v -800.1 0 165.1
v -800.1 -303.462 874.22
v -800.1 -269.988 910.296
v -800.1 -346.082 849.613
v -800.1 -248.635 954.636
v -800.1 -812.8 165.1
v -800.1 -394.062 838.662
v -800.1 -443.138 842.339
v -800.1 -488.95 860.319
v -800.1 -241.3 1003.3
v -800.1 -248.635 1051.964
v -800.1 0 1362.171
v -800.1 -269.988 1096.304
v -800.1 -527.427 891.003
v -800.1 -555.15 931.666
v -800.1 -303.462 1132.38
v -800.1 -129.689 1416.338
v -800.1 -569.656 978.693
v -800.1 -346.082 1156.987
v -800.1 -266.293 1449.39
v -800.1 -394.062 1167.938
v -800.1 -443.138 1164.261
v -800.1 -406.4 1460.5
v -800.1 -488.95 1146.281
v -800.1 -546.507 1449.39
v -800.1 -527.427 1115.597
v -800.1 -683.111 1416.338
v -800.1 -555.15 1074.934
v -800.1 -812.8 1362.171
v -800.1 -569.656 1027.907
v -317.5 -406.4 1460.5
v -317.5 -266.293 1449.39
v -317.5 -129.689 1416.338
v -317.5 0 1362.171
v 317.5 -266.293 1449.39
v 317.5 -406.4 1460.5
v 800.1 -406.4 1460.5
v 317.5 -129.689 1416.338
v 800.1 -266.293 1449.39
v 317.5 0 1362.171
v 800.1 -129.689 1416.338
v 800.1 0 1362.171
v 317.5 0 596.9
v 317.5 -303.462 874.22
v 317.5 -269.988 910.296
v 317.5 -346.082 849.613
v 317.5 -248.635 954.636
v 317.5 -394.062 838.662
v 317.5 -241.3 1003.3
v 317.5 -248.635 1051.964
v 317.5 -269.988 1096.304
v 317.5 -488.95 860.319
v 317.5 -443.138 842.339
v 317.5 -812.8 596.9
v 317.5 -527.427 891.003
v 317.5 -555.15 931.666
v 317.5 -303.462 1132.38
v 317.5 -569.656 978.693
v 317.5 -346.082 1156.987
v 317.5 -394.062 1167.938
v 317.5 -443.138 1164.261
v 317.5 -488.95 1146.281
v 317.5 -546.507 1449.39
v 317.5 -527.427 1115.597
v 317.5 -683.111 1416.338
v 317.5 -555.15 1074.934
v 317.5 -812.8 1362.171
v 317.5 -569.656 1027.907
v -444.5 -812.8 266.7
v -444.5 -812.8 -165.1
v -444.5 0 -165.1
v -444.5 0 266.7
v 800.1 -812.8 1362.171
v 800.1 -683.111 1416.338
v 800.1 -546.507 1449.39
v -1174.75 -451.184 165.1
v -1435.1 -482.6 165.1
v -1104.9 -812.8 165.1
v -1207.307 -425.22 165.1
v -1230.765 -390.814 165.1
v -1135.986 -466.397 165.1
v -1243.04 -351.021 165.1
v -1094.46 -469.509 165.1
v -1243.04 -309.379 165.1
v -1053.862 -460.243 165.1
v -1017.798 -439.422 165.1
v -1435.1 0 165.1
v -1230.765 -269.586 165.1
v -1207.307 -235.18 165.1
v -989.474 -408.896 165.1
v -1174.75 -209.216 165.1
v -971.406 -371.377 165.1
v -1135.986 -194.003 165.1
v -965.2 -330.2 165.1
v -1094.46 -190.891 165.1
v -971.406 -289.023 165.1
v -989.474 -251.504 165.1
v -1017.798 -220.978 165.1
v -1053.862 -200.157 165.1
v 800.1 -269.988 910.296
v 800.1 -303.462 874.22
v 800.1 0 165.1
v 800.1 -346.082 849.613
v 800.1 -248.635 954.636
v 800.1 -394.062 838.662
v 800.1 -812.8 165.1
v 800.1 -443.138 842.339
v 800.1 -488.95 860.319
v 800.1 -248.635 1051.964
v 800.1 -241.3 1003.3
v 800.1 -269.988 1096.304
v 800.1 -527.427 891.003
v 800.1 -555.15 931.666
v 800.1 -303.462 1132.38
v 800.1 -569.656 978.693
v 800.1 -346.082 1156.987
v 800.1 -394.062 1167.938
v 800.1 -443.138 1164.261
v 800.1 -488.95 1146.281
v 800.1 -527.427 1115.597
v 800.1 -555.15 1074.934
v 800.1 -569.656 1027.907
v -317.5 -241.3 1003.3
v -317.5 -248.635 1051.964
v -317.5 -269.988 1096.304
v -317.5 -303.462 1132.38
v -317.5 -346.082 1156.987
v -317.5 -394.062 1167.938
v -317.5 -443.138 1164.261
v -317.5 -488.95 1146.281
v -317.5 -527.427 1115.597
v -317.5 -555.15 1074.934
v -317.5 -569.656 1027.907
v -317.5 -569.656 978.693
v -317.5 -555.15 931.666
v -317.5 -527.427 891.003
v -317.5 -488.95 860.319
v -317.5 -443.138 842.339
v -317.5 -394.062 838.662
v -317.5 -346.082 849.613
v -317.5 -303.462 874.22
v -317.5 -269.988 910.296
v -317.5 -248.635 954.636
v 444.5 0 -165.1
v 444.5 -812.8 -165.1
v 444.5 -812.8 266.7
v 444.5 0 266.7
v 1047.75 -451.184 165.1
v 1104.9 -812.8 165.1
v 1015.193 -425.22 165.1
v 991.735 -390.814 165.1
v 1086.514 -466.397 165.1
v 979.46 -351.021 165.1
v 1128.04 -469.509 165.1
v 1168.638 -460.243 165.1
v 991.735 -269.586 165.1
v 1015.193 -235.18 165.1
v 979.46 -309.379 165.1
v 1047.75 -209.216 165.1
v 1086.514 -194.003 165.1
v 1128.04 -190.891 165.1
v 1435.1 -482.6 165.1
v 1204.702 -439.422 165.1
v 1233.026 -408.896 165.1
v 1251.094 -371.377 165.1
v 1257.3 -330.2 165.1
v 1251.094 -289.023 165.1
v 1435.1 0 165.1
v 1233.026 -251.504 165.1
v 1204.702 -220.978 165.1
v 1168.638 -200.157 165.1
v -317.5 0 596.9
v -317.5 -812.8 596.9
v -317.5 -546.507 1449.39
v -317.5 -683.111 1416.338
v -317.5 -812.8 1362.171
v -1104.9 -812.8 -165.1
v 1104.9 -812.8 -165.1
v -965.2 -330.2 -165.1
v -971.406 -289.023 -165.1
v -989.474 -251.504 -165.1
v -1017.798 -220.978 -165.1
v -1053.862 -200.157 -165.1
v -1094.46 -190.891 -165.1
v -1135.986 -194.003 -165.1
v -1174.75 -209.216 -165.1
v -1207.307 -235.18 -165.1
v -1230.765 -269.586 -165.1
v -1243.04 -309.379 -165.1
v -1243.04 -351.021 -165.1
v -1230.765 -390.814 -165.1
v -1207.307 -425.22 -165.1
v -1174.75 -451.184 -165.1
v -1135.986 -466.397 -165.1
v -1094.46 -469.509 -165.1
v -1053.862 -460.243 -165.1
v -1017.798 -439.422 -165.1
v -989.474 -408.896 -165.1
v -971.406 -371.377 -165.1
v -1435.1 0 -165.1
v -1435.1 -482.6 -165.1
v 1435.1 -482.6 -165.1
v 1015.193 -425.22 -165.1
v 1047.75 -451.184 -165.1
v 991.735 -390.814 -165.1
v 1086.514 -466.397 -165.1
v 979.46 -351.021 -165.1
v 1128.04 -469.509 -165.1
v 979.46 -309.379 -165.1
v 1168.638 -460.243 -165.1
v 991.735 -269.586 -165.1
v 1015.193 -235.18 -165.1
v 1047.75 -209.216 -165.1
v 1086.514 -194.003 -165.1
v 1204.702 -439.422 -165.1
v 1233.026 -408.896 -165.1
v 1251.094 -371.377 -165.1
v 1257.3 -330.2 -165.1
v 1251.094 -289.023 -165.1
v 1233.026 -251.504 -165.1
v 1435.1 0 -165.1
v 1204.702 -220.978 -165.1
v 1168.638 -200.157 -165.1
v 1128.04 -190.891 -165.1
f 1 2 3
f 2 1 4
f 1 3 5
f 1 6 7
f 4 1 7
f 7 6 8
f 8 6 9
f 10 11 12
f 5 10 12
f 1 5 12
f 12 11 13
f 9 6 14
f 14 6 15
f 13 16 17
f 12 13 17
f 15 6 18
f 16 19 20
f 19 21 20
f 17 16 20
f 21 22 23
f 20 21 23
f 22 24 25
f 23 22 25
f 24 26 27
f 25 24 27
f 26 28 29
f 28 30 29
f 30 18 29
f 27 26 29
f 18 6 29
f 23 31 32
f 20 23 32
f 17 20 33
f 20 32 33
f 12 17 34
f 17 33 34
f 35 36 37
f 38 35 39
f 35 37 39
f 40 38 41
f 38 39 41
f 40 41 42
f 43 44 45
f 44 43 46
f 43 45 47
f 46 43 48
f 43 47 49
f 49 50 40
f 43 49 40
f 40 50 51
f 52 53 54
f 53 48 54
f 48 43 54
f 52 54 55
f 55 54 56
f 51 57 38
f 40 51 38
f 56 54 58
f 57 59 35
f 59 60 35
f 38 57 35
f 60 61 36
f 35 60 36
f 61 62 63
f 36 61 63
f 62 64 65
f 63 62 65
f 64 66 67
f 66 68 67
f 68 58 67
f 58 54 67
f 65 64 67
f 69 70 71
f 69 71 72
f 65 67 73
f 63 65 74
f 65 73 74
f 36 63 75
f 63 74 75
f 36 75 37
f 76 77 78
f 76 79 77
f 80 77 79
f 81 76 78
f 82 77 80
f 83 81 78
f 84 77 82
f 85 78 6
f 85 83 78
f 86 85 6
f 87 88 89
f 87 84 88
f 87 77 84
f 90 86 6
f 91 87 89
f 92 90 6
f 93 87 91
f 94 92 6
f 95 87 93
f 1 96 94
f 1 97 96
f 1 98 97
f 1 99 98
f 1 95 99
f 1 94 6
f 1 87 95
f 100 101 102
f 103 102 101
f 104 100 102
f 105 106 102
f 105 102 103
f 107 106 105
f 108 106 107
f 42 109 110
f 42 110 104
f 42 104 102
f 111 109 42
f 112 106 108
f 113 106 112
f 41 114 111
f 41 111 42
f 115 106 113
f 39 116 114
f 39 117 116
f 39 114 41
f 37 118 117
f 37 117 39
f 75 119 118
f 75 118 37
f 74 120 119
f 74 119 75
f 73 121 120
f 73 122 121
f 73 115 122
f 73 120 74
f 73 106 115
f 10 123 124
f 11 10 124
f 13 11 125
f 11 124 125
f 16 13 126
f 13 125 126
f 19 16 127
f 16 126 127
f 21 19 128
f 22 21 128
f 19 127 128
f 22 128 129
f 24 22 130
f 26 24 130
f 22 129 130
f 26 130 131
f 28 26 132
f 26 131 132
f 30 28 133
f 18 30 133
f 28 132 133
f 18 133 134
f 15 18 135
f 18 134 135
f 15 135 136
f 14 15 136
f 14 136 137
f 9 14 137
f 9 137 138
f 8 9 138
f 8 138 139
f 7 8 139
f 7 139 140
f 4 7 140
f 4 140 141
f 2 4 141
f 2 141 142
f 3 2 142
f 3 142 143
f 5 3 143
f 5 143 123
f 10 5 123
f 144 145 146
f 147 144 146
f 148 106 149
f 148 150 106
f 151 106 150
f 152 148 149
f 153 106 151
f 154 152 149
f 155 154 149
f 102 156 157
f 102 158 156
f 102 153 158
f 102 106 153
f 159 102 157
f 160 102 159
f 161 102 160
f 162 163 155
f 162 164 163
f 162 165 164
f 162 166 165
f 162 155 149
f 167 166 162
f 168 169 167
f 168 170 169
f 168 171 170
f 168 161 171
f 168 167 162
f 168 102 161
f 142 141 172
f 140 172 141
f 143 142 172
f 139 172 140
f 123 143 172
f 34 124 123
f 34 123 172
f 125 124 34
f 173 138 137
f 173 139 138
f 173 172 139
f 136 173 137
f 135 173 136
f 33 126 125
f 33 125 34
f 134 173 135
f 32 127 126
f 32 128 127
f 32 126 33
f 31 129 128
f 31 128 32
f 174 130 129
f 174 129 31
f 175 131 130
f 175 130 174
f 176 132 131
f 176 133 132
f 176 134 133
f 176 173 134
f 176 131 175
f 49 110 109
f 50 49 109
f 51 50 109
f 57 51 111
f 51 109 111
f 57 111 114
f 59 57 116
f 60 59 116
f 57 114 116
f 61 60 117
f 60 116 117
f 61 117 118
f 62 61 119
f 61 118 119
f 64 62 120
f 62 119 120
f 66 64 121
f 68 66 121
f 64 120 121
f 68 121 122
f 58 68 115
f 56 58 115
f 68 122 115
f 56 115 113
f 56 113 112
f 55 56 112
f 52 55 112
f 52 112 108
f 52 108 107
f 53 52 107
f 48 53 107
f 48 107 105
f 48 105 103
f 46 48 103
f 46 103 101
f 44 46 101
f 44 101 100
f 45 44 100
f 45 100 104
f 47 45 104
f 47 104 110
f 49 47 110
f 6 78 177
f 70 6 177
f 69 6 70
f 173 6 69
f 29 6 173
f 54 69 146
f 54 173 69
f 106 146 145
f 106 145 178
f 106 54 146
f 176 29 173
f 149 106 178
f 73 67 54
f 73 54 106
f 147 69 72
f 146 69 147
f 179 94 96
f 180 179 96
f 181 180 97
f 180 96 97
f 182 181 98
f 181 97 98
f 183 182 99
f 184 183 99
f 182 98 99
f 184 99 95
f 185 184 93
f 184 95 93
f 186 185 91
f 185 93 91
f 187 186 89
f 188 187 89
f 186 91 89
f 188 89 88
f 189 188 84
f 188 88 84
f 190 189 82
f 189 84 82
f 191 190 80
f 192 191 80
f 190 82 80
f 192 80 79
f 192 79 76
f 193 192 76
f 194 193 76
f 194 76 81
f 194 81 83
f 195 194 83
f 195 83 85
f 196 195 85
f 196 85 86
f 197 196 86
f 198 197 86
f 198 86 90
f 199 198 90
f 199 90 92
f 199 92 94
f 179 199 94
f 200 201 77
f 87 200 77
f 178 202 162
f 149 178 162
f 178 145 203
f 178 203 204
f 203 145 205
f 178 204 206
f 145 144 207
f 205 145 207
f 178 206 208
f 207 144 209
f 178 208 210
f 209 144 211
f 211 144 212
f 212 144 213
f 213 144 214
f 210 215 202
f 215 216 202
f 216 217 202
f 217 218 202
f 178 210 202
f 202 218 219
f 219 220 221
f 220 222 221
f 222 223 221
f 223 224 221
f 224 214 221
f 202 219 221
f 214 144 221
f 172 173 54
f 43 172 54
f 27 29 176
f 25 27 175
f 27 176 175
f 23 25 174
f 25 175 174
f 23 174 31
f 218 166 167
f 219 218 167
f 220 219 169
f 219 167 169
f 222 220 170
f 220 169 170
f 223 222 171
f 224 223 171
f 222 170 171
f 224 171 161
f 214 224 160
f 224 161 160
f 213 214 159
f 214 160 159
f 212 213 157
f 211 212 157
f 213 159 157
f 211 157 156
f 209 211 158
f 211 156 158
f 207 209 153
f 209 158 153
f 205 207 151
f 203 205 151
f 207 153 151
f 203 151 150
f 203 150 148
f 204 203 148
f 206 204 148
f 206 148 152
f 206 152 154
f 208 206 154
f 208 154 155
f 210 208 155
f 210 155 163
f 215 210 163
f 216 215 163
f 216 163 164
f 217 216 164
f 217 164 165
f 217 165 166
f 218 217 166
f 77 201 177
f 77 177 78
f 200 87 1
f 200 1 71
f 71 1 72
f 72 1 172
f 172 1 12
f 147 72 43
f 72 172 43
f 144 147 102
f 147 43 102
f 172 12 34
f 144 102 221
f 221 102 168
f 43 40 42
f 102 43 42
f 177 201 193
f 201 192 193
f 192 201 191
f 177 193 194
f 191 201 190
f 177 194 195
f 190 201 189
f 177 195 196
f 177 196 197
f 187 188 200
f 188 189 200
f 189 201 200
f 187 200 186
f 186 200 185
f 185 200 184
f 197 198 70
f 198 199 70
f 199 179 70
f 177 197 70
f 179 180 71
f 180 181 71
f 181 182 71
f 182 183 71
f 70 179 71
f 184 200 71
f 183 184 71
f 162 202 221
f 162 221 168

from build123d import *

# Parameters (mm, degrees)
F0_W       = 2870.2
F0_H       = 330.2
F1_DEPTH   = 25.4
F2_DEPTH   = 812.8
F3_W       = 482.6
F3_H       = 1295.4
F4_DEPTH   = 812.8
F5_W       = 635
F5_H       = 431.8
F6_DEPTH   = 812.8
F7_W       = 889
F7_H       = 431.8
F8_DEPTH   = 812.801
F9_R       = 139.7
F10_DEPTH  = 330.201
F11_SIZE2  = 330.2
F11_SIZE   = 330.2
F12_R      = 165.1
F13_DEPTH  = 25.4
F13_FACE_R = 165.1
F14_DEPTH  = 2260.601
F16_DEPTH  = 2235.201


with BuildPart() as f1:
    # F0 (on Front) → F1 (new body)
    with BuildSketch(Plane.XZ):
        Rectangle(F0_W, F0_H)
    extrude(amount=F1_DEPTH)

    # F0 (on Front) → F2 (join)
    with BuildSketch(Plane.XZ):
        Rectangle(F0_W, F0_H)
    extrude(amount=F2_DEPTH)

    # F3 (on face) → F4 (join)
    with BuildSketch(Plane.XZ.offset(812.8)):
        with Locations((-558.8, 812.8)):
            Rectangle(F3_W, F3_H)
        with Locations((558.8, 812.8)):
            Rectangle(F3_W, F3_H)
    extrude(amount=-F4_DEPTH)

    # F5 (on face) → F6 (join)
    with BuildSketch(Plane.XZ.offset(812.8)):
        with Locations((0, 381)):
            Rectangle(F5_W, F5_H)
    extrude(amount=-F6_DEPTH)

    # F7 (on face) → F8 (cut, through all)
    with BuildSketch(Plane.XZ.offset(812.8)):
        with Locations((0, 50.8)):
            Rectangle(F7_W, F7_H)
    extrude(amount=-F8_DEPTH, mode=Mode.SUBTRACT)

    # F9 (on face) → F10 (cut, through all)
    with BuildSketch(Plane.XY.offset(165.1)):
        with Locations((1117.6, -330.2)):
            Circle(F9_R)
        with Locations((-1104.9, -330.2)):
            Circle(F9_R)
    extrude(amount=-F10_DEPTH, mode=Mode.SUBTRACT)

    # F11
    f11_edges = [f1.edges().sort_by_distance(p)[0] for p in [
        (-1435.1, -812.8, 0),
        (1435.1, -812.8, 0),
    ]]
    chamfer(f11_edges, length=F11_SIZE, length2=F11_SIZE2)

    # F12 (on face) → F13 (join)
    with BuildSketch(Plane.YZ.offset(800.1)):
        with Locations((-406.4, 1003.3)):
            Circle(F12_R)
    extrude(amount=F13_DEPTH)

    # F13_face (on face) → F14 (cut, through all)
    with BuildSketch(Plane(origin=(825.5, -406.4, 1003.3), x_dir=(0, 1, 0), z_dir=(1, 0, 0))):
        Circle(F13_FACE_R)
    extrude(amount=-F14_DEPTH, mode=Mode.SUBTRACT)

    # F15 (on face) → F16 (cut, through all)
    with BuildSketch(Plane.YZ.offset(800.1)):
        with BuildLine():
            ThreePointArc((-814.493537, 1361.297863), (-616.388928, 1435.343533), (-406.4, 1460.5))
            Line((-406.4, 1460.5), (-812.8, 1460.5))
            Line((-812.8, 1460.5), (-814.493537, 1361.297863))
        make_face()
        with BuildLine():
            ThreePointArc((-406.4, 1460.5), (-197.336836, 1435.568049), (0, 1362.170627))
            Line((0, 1362.170627), (0, 1460.5))
            Line((0, 1460.5), (-406.4, 1460.5))
        make_face()
    extrude(amount=-F16_DEPTH, mode=Mode.SUBTRACT)


solid = f1.part
